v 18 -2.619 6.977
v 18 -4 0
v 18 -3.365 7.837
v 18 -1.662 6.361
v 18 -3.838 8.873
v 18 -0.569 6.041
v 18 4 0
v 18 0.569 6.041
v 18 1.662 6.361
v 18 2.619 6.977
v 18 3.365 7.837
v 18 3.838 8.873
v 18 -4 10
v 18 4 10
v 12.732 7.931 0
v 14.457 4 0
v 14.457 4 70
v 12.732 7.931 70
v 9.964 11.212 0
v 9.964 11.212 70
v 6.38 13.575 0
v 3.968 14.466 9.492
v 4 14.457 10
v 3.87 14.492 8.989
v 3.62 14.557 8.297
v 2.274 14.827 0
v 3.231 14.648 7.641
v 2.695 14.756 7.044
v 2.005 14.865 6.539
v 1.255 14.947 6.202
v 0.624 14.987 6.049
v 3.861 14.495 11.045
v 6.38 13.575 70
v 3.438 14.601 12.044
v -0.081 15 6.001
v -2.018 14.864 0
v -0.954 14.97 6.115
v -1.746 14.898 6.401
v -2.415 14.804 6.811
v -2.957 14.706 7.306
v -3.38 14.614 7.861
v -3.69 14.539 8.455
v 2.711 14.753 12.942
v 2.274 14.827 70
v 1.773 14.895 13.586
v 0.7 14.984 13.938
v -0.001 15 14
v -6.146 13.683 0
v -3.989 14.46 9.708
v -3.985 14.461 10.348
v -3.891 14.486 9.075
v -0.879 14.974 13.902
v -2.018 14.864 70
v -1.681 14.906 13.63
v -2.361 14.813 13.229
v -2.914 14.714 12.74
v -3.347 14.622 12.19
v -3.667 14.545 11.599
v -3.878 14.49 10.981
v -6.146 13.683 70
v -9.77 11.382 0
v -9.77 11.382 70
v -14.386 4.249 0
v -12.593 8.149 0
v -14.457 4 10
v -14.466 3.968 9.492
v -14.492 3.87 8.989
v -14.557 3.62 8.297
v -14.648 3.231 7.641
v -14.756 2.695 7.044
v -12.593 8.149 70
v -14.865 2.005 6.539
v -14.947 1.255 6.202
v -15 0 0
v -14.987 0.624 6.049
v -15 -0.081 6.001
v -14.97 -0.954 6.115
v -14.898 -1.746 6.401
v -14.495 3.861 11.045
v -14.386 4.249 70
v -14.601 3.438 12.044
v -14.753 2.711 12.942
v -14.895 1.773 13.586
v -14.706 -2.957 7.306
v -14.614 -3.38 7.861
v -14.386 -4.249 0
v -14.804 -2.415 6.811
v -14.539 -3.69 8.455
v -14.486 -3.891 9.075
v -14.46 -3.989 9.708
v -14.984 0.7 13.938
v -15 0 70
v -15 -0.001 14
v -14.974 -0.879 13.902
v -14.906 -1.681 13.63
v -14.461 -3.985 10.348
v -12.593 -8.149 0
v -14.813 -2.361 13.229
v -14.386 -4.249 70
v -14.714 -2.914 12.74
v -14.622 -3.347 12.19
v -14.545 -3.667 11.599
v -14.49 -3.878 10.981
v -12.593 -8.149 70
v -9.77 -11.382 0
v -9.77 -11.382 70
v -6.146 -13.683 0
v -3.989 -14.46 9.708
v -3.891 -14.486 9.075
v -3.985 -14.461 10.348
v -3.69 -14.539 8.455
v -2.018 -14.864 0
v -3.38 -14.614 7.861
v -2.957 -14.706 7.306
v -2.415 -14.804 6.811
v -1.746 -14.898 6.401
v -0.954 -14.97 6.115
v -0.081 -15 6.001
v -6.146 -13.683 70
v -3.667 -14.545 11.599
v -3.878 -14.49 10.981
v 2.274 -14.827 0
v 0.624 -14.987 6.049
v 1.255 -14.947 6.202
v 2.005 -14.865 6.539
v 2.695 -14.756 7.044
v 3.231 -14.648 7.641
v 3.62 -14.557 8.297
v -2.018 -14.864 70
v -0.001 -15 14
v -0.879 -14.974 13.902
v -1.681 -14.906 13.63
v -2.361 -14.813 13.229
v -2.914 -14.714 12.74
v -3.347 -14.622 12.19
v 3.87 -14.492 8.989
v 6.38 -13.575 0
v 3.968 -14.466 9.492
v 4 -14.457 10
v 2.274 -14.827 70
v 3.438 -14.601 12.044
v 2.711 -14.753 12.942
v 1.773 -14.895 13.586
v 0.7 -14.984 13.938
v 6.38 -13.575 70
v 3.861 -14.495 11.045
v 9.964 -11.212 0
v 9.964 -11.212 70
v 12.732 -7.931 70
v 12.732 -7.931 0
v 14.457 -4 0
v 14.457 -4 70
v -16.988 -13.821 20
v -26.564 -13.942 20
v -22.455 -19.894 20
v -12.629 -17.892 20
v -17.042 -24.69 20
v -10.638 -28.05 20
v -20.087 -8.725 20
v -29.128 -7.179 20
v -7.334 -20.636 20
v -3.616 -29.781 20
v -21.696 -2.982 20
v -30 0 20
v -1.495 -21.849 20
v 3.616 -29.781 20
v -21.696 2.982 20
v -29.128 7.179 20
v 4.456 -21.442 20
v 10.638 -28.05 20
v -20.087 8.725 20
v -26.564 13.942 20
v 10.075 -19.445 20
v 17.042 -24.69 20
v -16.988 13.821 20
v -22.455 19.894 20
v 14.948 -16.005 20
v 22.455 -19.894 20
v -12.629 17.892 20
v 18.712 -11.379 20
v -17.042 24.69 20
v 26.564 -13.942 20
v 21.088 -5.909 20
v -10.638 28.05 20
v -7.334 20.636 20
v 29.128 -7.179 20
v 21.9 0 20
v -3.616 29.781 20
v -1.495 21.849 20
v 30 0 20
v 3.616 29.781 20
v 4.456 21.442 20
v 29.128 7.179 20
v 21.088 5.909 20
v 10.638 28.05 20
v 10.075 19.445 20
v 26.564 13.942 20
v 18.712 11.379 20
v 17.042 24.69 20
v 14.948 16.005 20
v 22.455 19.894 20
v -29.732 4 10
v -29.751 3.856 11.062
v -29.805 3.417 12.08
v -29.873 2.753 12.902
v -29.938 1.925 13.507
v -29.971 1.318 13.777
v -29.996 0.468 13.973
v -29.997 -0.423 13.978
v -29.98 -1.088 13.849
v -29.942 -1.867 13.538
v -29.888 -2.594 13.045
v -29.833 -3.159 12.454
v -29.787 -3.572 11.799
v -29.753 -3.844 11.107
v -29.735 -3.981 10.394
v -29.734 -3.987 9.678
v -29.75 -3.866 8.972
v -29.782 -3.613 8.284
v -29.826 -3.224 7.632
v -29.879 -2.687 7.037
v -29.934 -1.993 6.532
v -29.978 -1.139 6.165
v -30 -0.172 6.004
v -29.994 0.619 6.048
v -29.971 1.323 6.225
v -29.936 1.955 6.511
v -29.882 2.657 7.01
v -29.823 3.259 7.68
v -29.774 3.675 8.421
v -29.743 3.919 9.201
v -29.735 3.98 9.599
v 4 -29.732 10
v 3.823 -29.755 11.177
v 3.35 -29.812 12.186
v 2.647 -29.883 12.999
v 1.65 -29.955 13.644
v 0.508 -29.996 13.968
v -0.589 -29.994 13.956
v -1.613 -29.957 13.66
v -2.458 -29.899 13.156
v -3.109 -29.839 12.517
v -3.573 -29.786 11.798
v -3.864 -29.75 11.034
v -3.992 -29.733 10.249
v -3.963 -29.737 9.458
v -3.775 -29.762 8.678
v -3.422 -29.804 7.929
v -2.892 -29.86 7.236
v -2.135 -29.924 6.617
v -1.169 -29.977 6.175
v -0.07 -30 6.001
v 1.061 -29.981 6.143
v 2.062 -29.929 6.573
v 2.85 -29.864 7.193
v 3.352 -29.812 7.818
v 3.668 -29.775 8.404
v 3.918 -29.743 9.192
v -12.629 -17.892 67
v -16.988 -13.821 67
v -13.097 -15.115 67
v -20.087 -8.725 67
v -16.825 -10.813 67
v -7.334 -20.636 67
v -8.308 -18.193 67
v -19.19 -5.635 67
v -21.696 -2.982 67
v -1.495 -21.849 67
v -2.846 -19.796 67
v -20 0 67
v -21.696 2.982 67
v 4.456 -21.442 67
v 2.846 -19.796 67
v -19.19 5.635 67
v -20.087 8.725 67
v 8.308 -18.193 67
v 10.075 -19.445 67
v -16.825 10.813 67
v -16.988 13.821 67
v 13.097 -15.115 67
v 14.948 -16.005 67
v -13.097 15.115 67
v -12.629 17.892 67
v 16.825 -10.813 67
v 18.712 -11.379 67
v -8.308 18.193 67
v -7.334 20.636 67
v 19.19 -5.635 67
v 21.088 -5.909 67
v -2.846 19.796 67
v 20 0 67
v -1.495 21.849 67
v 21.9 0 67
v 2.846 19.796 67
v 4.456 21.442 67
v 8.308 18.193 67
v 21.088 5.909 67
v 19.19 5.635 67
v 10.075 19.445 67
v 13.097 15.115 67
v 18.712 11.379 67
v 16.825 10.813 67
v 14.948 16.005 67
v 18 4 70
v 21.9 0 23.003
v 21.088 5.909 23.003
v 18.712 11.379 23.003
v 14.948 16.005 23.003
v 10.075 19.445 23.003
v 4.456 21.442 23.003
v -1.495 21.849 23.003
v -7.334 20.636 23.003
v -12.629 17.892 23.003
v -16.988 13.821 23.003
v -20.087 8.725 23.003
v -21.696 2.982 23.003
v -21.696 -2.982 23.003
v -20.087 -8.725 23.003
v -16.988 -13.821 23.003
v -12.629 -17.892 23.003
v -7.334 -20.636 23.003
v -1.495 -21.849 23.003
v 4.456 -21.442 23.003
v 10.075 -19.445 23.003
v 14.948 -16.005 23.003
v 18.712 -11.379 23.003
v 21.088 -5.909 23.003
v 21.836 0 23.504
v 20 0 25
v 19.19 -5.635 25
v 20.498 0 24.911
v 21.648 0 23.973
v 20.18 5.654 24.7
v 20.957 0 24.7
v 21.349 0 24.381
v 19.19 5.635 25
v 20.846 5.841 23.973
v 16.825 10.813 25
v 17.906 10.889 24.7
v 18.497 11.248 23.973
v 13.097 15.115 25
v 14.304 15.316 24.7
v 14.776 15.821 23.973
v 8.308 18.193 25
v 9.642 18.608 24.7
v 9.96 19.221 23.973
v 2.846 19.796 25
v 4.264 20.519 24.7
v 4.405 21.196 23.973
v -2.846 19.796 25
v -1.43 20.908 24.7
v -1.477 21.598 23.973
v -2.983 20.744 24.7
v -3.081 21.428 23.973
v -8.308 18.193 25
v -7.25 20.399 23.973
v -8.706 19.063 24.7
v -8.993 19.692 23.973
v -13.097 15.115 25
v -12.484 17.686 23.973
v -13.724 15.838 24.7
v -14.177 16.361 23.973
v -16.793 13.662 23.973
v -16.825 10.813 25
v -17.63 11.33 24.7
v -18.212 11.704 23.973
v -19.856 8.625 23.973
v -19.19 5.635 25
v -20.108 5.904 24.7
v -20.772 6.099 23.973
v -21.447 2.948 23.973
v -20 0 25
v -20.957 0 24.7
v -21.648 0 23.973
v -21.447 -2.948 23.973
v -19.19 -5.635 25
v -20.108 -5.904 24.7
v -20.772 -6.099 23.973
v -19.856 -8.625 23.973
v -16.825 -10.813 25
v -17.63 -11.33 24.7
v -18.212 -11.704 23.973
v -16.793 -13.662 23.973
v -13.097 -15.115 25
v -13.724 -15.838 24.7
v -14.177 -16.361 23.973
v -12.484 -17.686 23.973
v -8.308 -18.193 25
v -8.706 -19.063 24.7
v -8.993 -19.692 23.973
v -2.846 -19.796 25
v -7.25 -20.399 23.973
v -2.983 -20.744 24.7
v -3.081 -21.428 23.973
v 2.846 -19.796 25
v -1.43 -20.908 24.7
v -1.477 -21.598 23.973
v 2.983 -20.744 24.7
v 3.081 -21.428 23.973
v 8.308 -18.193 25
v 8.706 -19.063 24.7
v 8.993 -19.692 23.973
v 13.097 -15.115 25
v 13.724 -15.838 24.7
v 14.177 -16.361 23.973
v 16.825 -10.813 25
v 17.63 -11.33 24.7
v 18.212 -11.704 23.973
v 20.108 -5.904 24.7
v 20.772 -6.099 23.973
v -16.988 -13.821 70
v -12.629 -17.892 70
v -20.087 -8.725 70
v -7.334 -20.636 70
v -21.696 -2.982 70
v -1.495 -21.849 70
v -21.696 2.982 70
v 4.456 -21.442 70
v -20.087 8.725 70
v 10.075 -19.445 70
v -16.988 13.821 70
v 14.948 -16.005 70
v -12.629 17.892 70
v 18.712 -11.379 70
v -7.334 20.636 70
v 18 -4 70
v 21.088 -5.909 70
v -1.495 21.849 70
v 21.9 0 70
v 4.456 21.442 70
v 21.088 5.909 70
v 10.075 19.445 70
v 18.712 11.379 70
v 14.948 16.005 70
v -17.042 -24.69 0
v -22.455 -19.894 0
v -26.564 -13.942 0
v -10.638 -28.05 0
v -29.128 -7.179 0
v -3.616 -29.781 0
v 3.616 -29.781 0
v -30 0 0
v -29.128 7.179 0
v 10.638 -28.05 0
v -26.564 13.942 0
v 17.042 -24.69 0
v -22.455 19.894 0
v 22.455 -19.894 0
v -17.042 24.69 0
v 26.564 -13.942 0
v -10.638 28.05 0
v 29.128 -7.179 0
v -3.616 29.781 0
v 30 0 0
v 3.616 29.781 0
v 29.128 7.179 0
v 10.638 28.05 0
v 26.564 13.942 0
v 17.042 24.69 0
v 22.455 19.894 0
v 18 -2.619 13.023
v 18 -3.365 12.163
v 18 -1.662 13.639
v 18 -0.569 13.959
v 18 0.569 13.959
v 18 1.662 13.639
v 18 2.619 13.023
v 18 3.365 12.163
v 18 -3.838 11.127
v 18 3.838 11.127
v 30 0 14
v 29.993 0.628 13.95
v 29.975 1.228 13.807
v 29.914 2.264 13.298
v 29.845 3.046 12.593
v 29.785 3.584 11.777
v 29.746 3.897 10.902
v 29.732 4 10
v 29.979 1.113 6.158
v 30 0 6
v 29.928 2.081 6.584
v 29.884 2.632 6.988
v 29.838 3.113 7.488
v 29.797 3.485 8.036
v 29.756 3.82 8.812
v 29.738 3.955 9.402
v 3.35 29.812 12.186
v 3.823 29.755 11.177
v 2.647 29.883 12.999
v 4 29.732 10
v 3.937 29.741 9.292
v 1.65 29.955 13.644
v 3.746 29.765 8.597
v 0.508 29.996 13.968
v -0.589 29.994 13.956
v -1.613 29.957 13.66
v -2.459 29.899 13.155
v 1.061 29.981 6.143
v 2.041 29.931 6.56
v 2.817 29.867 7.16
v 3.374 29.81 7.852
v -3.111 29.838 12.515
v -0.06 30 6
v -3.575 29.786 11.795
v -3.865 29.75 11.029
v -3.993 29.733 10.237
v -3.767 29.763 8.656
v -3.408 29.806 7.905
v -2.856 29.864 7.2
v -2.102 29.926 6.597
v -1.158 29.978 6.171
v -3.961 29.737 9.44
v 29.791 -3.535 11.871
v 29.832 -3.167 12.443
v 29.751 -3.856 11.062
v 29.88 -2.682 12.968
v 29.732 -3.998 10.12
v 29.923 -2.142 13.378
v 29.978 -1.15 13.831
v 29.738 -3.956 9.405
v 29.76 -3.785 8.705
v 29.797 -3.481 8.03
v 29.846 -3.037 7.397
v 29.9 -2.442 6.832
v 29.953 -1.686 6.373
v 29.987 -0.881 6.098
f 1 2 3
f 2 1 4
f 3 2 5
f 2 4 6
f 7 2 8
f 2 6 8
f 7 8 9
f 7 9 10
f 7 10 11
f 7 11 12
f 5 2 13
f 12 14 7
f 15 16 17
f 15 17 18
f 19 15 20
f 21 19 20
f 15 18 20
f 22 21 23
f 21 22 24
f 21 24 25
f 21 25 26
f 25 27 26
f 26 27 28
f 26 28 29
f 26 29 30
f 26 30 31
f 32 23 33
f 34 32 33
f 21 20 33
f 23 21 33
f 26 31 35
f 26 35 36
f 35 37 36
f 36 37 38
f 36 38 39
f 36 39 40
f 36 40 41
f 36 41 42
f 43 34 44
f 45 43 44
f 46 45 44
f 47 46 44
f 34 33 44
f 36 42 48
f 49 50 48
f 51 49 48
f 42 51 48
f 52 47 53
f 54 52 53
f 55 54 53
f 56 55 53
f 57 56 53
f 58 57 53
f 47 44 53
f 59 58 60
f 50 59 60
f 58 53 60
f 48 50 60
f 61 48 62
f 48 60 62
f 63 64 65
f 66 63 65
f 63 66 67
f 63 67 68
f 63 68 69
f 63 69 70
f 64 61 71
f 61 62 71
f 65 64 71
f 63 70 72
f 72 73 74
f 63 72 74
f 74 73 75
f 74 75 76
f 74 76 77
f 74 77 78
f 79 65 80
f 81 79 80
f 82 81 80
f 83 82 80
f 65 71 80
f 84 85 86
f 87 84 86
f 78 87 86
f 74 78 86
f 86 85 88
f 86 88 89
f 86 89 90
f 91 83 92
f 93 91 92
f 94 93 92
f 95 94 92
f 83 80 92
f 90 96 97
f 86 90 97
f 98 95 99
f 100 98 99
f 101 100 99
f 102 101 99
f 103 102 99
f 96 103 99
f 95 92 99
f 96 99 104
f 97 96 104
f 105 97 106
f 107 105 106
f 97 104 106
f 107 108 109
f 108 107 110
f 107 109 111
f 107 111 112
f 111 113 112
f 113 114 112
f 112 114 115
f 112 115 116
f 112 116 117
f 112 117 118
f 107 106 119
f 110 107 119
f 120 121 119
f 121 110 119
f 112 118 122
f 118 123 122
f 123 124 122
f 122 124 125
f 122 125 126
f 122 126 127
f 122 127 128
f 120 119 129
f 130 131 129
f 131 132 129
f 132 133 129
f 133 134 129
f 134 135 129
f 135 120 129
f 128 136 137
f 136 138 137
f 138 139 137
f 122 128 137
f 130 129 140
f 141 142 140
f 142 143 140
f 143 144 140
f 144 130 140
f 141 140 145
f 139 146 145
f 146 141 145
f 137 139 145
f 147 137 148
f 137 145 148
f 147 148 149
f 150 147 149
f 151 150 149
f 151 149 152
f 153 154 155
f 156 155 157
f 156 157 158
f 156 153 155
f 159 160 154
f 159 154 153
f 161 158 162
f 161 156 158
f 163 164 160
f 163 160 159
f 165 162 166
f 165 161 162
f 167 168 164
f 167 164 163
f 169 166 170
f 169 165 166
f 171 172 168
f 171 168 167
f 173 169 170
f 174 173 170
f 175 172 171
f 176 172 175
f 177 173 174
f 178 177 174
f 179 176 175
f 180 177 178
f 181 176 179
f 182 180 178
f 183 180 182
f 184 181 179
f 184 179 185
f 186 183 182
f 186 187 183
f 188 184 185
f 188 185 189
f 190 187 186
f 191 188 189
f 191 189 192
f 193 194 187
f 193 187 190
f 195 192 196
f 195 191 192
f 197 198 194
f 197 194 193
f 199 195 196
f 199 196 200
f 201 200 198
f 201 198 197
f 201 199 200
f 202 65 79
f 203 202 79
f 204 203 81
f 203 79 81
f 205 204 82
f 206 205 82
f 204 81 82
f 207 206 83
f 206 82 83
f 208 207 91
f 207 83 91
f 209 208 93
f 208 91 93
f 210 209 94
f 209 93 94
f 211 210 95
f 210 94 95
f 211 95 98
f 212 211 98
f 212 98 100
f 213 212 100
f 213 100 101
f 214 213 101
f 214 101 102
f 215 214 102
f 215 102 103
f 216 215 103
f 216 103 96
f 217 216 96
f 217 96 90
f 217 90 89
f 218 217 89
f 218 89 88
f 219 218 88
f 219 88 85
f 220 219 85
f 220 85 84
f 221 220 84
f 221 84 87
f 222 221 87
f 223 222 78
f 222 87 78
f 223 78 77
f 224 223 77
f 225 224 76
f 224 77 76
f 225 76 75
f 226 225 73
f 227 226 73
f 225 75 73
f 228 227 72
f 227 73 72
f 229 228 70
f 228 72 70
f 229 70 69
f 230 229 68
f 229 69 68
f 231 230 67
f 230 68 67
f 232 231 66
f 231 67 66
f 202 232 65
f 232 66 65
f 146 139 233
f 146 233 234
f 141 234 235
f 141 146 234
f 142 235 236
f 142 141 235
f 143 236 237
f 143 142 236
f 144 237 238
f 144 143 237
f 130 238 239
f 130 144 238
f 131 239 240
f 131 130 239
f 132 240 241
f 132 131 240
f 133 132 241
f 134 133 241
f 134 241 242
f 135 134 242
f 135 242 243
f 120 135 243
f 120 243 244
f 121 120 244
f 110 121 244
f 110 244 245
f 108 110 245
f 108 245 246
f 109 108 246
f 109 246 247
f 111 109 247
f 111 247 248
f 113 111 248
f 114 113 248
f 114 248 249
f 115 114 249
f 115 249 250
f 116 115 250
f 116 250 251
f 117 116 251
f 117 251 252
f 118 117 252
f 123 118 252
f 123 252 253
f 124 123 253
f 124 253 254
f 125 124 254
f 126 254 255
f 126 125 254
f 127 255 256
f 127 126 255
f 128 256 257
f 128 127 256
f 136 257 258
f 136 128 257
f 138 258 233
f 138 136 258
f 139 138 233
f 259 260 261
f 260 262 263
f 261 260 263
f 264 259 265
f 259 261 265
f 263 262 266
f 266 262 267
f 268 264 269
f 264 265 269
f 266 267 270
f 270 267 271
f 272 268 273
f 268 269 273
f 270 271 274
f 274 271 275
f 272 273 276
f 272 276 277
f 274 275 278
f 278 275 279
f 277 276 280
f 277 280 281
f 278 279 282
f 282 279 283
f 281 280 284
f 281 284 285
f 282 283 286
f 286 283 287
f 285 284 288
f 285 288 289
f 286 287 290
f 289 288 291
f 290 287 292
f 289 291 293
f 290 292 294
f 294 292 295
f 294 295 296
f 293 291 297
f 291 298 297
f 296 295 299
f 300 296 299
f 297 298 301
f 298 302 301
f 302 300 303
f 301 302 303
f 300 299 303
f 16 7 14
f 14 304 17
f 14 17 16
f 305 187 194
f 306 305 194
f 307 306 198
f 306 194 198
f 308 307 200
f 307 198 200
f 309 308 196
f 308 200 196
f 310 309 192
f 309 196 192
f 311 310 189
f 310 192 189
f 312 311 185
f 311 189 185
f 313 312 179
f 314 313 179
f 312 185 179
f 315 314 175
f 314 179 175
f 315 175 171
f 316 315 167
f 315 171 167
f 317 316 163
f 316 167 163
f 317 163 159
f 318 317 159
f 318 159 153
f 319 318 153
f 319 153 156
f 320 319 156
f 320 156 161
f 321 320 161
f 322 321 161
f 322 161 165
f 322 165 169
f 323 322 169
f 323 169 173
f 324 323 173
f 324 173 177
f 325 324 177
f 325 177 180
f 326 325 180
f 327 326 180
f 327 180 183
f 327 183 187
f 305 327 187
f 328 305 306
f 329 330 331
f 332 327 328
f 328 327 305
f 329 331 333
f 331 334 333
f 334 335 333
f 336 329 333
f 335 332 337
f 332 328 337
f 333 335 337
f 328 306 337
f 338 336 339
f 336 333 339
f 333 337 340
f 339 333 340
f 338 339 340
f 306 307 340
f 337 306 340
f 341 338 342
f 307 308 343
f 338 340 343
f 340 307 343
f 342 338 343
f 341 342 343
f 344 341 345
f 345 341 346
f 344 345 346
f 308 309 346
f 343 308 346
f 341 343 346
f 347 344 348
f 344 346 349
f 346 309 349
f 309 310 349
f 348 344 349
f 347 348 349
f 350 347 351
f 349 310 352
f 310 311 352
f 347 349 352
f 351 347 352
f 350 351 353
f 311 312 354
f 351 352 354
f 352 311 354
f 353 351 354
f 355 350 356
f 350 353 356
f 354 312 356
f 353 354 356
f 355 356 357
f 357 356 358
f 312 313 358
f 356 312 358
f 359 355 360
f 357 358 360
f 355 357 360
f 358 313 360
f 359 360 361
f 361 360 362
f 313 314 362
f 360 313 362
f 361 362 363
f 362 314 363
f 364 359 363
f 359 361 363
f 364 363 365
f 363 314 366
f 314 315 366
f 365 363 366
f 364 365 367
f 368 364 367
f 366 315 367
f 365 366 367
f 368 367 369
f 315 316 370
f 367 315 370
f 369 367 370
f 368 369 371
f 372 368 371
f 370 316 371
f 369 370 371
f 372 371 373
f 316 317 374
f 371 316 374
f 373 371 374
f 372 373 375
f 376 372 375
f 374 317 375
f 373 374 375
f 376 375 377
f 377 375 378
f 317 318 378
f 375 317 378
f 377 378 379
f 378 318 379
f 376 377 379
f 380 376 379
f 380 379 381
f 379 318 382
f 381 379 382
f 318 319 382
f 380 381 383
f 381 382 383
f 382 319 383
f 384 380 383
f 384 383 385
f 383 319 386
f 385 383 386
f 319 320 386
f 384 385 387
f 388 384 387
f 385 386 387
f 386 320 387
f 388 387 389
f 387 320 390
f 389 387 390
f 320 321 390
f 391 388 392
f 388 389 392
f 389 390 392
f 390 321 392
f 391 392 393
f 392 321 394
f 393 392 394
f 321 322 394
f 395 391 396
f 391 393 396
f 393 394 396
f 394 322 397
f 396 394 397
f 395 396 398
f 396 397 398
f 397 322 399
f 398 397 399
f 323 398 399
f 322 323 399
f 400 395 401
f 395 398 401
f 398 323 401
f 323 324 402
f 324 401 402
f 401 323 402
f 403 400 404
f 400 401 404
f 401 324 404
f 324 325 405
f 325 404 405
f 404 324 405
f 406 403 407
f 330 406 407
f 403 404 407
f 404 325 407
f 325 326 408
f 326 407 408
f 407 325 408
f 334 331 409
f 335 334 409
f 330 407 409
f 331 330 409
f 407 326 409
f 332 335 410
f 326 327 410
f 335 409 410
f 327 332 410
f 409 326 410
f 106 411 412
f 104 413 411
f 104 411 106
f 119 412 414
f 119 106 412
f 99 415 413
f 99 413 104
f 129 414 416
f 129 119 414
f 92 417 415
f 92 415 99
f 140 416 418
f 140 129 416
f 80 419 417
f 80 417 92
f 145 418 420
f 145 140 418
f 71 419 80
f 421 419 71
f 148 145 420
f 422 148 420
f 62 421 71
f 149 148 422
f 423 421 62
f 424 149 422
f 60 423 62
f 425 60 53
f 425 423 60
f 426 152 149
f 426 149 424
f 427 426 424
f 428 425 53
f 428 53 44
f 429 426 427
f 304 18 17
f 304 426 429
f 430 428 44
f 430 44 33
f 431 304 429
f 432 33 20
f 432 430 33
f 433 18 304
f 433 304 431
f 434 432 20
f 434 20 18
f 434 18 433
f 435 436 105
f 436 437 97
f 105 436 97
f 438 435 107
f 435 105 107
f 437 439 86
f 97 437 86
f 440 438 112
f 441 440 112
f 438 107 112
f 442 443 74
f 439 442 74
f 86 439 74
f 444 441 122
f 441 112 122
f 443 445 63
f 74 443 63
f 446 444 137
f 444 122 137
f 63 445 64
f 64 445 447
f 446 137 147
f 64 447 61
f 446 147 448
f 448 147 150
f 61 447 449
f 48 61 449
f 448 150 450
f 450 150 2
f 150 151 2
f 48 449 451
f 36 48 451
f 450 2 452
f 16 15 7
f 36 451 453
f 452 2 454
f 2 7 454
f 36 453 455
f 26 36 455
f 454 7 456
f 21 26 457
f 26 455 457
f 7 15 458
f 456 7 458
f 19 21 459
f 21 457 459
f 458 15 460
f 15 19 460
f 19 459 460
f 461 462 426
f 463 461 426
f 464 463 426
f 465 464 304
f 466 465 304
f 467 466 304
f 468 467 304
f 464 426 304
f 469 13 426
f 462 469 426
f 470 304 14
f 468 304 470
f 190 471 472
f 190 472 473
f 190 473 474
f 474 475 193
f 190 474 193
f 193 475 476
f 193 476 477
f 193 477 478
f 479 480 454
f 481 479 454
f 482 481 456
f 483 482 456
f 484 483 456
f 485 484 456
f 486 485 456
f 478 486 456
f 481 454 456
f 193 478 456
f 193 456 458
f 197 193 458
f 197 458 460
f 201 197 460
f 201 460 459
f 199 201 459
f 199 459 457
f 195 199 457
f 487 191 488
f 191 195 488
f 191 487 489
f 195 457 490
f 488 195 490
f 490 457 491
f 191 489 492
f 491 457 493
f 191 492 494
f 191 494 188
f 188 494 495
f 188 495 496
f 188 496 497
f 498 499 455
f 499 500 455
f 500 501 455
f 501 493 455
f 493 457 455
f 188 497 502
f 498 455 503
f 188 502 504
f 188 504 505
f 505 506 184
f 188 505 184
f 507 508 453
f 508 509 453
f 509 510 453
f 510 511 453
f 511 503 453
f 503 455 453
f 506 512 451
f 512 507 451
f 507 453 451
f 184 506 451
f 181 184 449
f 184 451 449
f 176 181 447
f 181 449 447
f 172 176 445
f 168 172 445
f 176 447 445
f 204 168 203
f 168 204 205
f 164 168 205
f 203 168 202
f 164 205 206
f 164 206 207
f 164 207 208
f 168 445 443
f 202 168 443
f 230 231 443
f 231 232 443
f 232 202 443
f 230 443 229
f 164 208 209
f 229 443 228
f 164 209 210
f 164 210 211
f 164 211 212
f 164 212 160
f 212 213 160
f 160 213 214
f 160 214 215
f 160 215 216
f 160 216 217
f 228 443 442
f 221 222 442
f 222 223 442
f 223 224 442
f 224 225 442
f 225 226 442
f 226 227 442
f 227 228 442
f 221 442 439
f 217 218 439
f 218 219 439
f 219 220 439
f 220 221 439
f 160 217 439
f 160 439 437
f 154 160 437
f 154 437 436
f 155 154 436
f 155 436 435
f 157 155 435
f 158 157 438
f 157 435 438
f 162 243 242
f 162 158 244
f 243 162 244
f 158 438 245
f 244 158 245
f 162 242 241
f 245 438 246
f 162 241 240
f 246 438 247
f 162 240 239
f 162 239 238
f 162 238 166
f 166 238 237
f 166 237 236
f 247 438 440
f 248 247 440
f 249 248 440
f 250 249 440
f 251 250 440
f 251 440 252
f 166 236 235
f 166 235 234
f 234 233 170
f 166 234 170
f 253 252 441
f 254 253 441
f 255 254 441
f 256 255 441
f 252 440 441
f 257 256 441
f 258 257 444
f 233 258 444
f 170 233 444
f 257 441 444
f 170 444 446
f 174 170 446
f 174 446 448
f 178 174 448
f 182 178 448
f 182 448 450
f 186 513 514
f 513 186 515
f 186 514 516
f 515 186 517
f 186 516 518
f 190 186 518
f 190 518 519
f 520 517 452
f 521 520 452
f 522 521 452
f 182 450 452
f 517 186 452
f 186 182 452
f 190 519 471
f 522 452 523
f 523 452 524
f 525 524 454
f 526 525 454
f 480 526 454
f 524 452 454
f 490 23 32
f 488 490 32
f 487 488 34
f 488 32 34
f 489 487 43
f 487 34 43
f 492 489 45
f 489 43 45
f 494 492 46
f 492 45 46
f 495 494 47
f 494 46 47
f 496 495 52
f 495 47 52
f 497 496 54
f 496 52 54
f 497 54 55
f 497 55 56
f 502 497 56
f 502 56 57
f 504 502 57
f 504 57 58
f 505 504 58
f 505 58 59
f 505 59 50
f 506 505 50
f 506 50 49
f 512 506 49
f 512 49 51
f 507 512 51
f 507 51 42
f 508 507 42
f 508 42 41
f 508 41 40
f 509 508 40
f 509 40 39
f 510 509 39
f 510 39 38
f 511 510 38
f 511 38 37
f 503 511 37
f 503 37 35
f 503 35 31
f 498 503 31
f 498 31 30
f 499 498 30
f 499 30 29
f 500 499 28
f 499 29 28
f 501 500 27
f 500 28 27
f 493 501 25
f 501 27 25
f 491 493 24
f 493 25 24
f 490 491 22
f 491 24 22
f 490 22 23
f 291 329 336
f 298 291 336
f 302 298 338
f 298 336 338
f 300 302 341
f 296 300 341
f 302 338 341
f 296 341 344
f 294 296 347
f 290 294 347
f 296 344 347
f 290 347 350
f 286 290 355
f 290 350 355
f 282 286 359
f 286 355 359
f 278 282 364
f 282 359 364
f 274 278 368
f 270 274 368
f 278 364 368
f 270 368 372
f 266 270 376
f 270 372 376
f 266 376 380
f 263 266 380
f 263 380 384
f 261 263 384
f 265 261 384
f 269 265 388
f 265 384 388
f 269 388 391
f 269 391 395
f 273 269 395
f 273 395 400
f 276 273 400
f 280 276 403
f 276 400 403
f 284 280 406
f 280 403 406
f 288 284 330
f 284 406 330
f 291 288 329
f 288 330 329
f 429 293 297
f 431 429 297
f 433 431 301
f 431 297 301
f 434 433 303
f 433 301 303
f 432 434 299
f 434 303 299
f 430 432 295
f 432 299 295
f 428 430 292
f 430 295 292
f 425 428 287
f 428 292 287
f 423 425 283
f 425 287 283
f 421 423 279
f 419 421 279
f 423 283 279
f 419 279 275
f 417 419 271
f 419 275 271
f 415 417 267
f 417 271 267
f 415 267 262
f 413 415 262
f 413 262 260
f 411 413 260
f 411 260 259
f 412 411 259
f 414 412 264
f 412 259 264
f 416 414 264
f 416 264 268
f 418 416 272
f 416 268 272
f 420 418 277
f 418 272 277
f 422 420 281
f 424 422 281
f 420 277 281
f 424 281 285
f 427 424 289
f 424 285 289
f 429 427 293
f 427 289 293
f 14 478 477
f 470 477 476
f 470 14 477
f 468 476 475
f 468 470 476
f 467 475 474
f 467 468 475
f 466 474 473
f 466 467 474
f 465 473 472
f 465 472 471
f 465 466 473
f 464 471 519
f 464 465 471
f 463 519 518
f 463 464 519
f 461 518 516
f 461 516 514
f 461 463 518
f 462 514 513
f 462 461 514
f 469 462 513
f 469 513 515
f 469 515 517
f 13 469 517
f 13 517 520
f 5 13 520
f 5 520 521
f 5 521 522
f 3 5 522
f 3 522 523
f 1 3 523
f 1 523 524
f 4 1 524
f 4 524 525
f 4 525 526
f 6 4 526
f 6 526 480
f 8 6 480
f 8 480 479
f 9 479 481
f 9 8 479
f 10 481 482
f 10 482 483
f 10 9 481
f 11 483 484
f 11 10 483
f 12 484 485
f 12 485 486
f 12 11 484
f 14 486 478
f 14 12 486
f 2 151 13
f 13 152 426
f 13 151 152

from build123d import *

# Parameters (mm, degrees)
F0_R           = 30
F1_DEPTH       = 20
F2_R           = 21.9
F3_DEPTH       = 5
F4_R           = 20
F5_DEPTH       = 42
F6_R           = 21.9
F7_DEPTH       = 3
F10_DEPTH      = 75
F11_R          = 4
F12_DEPTH      = 100
F12_DEPTH_BACK = 100
F13_R          = 4
F14_DEPTH      = 100
F14_DEPTH_BACK = 100


# Not quite as in the source:
# - a fillet or chamfer that OpenCascade refuses, or shapes differently, is made with other operations: its cross-section is extruded or revolved along the edge and cut away or added


with BuildPart() as f1:
    # F0 (on Top) → F1 (new body)
    with BuildSketch(Plane.XY):
        Circle(F0_R)
    extrude(amount=F1_DEPTH)

    # F2 (on face) → F3 (join)
    with BuildSketch(Plane.XY.offset(20)):
        Circle(F2_R)
    extrude(amount=F3_DEPTH)

    # F4 (on face) → F5 (join)
    with BuildSketch(Plane.XY.offset(25)):
        Circle(F4_R)
    extrude(amount=F5_DEPTH)

    # F6 (on face) → F7 (join)
    with BuildSketch(Plane.XY.offset(67)):
        Circle(F6_R)
    extrude(amount=F7_DEPTH)

    # F8: fillet of radius 2 on 1 edges, made by hand

    # F8_s1 → F8_t2 (revolve, cut)
    with BuildSketch(Plane.XZ):
        with BuildLine():
            ThreePointArc((20, 25), (21.3491376746, 24.3809064397), (21.9, 23.0025015645))
            Line((21.9, 23.0025015645), (21.9, 25))
            Line((21.9, 25), (20, 25))
        make_face()
    revolve(axis=Axis((0, 0, 25), (0, 0, 1)), mode=Mode.SUBTRACT)

    # F9 (on face) → F10 (cut)
    with BuildSketch(Plane.XY.offset(70)):
        with BuildLine():
            Line((18, 4), (14.4568322948, 4))
            ThreePointArc((14.4568322948, 4), (-2.0183552187, 14.8635877974), (-15, 0))
            Line((-15, 0), (0, 0))
            Line((0, 0), (15, 0))
            Line((15, 0), (18, 0))
            Line((18, 0), (18, 4))
        make_face()
        with BuildLine():
            Line((0, 0), (-15, 0))
            ThreePointArc((-15, 0), (-2.0183552187, -14.8635877974), (14.4568322948, -4))
            Line((14.4568322948, -4), (18, -4))
            Line((18, -4), (18, 0))
            Line((18, 0), (15, 0))
            Line((15, 0), (0, 0))
        make_face()
    extrude(amount=-F10_DEPTH, mode=Mode.SUBTRACT)

    # F11 (on Right) → F12 (cut, two sides)
    with BuildSketch(Plane.YZ) as f12_sk:
        with Locations((0, 10)):
            Circle(F11_R)
    extrude(amount=F12_DEPTH, mode=Mode.SUBTRACT)
    extrude(f12_sk.sketch, amount=-F12_DEPTH_BACK, mode=Mode.SUBTRACT)

    # F13 (on Front) → F14 (cut, two sides)
    with BuildSketch(Plane.XZ) as f14_sk:
        with Locations((0, 10)):
            Circle(F13_R)
    extrude(amount=-F14_DEPTH, mode=Mode.SUBTRACT)
    extrude(f14_sk.sketch, amount=F14_DEPTH_BACK, mode=Mode.SUBTRACT)


solid = f1.part
